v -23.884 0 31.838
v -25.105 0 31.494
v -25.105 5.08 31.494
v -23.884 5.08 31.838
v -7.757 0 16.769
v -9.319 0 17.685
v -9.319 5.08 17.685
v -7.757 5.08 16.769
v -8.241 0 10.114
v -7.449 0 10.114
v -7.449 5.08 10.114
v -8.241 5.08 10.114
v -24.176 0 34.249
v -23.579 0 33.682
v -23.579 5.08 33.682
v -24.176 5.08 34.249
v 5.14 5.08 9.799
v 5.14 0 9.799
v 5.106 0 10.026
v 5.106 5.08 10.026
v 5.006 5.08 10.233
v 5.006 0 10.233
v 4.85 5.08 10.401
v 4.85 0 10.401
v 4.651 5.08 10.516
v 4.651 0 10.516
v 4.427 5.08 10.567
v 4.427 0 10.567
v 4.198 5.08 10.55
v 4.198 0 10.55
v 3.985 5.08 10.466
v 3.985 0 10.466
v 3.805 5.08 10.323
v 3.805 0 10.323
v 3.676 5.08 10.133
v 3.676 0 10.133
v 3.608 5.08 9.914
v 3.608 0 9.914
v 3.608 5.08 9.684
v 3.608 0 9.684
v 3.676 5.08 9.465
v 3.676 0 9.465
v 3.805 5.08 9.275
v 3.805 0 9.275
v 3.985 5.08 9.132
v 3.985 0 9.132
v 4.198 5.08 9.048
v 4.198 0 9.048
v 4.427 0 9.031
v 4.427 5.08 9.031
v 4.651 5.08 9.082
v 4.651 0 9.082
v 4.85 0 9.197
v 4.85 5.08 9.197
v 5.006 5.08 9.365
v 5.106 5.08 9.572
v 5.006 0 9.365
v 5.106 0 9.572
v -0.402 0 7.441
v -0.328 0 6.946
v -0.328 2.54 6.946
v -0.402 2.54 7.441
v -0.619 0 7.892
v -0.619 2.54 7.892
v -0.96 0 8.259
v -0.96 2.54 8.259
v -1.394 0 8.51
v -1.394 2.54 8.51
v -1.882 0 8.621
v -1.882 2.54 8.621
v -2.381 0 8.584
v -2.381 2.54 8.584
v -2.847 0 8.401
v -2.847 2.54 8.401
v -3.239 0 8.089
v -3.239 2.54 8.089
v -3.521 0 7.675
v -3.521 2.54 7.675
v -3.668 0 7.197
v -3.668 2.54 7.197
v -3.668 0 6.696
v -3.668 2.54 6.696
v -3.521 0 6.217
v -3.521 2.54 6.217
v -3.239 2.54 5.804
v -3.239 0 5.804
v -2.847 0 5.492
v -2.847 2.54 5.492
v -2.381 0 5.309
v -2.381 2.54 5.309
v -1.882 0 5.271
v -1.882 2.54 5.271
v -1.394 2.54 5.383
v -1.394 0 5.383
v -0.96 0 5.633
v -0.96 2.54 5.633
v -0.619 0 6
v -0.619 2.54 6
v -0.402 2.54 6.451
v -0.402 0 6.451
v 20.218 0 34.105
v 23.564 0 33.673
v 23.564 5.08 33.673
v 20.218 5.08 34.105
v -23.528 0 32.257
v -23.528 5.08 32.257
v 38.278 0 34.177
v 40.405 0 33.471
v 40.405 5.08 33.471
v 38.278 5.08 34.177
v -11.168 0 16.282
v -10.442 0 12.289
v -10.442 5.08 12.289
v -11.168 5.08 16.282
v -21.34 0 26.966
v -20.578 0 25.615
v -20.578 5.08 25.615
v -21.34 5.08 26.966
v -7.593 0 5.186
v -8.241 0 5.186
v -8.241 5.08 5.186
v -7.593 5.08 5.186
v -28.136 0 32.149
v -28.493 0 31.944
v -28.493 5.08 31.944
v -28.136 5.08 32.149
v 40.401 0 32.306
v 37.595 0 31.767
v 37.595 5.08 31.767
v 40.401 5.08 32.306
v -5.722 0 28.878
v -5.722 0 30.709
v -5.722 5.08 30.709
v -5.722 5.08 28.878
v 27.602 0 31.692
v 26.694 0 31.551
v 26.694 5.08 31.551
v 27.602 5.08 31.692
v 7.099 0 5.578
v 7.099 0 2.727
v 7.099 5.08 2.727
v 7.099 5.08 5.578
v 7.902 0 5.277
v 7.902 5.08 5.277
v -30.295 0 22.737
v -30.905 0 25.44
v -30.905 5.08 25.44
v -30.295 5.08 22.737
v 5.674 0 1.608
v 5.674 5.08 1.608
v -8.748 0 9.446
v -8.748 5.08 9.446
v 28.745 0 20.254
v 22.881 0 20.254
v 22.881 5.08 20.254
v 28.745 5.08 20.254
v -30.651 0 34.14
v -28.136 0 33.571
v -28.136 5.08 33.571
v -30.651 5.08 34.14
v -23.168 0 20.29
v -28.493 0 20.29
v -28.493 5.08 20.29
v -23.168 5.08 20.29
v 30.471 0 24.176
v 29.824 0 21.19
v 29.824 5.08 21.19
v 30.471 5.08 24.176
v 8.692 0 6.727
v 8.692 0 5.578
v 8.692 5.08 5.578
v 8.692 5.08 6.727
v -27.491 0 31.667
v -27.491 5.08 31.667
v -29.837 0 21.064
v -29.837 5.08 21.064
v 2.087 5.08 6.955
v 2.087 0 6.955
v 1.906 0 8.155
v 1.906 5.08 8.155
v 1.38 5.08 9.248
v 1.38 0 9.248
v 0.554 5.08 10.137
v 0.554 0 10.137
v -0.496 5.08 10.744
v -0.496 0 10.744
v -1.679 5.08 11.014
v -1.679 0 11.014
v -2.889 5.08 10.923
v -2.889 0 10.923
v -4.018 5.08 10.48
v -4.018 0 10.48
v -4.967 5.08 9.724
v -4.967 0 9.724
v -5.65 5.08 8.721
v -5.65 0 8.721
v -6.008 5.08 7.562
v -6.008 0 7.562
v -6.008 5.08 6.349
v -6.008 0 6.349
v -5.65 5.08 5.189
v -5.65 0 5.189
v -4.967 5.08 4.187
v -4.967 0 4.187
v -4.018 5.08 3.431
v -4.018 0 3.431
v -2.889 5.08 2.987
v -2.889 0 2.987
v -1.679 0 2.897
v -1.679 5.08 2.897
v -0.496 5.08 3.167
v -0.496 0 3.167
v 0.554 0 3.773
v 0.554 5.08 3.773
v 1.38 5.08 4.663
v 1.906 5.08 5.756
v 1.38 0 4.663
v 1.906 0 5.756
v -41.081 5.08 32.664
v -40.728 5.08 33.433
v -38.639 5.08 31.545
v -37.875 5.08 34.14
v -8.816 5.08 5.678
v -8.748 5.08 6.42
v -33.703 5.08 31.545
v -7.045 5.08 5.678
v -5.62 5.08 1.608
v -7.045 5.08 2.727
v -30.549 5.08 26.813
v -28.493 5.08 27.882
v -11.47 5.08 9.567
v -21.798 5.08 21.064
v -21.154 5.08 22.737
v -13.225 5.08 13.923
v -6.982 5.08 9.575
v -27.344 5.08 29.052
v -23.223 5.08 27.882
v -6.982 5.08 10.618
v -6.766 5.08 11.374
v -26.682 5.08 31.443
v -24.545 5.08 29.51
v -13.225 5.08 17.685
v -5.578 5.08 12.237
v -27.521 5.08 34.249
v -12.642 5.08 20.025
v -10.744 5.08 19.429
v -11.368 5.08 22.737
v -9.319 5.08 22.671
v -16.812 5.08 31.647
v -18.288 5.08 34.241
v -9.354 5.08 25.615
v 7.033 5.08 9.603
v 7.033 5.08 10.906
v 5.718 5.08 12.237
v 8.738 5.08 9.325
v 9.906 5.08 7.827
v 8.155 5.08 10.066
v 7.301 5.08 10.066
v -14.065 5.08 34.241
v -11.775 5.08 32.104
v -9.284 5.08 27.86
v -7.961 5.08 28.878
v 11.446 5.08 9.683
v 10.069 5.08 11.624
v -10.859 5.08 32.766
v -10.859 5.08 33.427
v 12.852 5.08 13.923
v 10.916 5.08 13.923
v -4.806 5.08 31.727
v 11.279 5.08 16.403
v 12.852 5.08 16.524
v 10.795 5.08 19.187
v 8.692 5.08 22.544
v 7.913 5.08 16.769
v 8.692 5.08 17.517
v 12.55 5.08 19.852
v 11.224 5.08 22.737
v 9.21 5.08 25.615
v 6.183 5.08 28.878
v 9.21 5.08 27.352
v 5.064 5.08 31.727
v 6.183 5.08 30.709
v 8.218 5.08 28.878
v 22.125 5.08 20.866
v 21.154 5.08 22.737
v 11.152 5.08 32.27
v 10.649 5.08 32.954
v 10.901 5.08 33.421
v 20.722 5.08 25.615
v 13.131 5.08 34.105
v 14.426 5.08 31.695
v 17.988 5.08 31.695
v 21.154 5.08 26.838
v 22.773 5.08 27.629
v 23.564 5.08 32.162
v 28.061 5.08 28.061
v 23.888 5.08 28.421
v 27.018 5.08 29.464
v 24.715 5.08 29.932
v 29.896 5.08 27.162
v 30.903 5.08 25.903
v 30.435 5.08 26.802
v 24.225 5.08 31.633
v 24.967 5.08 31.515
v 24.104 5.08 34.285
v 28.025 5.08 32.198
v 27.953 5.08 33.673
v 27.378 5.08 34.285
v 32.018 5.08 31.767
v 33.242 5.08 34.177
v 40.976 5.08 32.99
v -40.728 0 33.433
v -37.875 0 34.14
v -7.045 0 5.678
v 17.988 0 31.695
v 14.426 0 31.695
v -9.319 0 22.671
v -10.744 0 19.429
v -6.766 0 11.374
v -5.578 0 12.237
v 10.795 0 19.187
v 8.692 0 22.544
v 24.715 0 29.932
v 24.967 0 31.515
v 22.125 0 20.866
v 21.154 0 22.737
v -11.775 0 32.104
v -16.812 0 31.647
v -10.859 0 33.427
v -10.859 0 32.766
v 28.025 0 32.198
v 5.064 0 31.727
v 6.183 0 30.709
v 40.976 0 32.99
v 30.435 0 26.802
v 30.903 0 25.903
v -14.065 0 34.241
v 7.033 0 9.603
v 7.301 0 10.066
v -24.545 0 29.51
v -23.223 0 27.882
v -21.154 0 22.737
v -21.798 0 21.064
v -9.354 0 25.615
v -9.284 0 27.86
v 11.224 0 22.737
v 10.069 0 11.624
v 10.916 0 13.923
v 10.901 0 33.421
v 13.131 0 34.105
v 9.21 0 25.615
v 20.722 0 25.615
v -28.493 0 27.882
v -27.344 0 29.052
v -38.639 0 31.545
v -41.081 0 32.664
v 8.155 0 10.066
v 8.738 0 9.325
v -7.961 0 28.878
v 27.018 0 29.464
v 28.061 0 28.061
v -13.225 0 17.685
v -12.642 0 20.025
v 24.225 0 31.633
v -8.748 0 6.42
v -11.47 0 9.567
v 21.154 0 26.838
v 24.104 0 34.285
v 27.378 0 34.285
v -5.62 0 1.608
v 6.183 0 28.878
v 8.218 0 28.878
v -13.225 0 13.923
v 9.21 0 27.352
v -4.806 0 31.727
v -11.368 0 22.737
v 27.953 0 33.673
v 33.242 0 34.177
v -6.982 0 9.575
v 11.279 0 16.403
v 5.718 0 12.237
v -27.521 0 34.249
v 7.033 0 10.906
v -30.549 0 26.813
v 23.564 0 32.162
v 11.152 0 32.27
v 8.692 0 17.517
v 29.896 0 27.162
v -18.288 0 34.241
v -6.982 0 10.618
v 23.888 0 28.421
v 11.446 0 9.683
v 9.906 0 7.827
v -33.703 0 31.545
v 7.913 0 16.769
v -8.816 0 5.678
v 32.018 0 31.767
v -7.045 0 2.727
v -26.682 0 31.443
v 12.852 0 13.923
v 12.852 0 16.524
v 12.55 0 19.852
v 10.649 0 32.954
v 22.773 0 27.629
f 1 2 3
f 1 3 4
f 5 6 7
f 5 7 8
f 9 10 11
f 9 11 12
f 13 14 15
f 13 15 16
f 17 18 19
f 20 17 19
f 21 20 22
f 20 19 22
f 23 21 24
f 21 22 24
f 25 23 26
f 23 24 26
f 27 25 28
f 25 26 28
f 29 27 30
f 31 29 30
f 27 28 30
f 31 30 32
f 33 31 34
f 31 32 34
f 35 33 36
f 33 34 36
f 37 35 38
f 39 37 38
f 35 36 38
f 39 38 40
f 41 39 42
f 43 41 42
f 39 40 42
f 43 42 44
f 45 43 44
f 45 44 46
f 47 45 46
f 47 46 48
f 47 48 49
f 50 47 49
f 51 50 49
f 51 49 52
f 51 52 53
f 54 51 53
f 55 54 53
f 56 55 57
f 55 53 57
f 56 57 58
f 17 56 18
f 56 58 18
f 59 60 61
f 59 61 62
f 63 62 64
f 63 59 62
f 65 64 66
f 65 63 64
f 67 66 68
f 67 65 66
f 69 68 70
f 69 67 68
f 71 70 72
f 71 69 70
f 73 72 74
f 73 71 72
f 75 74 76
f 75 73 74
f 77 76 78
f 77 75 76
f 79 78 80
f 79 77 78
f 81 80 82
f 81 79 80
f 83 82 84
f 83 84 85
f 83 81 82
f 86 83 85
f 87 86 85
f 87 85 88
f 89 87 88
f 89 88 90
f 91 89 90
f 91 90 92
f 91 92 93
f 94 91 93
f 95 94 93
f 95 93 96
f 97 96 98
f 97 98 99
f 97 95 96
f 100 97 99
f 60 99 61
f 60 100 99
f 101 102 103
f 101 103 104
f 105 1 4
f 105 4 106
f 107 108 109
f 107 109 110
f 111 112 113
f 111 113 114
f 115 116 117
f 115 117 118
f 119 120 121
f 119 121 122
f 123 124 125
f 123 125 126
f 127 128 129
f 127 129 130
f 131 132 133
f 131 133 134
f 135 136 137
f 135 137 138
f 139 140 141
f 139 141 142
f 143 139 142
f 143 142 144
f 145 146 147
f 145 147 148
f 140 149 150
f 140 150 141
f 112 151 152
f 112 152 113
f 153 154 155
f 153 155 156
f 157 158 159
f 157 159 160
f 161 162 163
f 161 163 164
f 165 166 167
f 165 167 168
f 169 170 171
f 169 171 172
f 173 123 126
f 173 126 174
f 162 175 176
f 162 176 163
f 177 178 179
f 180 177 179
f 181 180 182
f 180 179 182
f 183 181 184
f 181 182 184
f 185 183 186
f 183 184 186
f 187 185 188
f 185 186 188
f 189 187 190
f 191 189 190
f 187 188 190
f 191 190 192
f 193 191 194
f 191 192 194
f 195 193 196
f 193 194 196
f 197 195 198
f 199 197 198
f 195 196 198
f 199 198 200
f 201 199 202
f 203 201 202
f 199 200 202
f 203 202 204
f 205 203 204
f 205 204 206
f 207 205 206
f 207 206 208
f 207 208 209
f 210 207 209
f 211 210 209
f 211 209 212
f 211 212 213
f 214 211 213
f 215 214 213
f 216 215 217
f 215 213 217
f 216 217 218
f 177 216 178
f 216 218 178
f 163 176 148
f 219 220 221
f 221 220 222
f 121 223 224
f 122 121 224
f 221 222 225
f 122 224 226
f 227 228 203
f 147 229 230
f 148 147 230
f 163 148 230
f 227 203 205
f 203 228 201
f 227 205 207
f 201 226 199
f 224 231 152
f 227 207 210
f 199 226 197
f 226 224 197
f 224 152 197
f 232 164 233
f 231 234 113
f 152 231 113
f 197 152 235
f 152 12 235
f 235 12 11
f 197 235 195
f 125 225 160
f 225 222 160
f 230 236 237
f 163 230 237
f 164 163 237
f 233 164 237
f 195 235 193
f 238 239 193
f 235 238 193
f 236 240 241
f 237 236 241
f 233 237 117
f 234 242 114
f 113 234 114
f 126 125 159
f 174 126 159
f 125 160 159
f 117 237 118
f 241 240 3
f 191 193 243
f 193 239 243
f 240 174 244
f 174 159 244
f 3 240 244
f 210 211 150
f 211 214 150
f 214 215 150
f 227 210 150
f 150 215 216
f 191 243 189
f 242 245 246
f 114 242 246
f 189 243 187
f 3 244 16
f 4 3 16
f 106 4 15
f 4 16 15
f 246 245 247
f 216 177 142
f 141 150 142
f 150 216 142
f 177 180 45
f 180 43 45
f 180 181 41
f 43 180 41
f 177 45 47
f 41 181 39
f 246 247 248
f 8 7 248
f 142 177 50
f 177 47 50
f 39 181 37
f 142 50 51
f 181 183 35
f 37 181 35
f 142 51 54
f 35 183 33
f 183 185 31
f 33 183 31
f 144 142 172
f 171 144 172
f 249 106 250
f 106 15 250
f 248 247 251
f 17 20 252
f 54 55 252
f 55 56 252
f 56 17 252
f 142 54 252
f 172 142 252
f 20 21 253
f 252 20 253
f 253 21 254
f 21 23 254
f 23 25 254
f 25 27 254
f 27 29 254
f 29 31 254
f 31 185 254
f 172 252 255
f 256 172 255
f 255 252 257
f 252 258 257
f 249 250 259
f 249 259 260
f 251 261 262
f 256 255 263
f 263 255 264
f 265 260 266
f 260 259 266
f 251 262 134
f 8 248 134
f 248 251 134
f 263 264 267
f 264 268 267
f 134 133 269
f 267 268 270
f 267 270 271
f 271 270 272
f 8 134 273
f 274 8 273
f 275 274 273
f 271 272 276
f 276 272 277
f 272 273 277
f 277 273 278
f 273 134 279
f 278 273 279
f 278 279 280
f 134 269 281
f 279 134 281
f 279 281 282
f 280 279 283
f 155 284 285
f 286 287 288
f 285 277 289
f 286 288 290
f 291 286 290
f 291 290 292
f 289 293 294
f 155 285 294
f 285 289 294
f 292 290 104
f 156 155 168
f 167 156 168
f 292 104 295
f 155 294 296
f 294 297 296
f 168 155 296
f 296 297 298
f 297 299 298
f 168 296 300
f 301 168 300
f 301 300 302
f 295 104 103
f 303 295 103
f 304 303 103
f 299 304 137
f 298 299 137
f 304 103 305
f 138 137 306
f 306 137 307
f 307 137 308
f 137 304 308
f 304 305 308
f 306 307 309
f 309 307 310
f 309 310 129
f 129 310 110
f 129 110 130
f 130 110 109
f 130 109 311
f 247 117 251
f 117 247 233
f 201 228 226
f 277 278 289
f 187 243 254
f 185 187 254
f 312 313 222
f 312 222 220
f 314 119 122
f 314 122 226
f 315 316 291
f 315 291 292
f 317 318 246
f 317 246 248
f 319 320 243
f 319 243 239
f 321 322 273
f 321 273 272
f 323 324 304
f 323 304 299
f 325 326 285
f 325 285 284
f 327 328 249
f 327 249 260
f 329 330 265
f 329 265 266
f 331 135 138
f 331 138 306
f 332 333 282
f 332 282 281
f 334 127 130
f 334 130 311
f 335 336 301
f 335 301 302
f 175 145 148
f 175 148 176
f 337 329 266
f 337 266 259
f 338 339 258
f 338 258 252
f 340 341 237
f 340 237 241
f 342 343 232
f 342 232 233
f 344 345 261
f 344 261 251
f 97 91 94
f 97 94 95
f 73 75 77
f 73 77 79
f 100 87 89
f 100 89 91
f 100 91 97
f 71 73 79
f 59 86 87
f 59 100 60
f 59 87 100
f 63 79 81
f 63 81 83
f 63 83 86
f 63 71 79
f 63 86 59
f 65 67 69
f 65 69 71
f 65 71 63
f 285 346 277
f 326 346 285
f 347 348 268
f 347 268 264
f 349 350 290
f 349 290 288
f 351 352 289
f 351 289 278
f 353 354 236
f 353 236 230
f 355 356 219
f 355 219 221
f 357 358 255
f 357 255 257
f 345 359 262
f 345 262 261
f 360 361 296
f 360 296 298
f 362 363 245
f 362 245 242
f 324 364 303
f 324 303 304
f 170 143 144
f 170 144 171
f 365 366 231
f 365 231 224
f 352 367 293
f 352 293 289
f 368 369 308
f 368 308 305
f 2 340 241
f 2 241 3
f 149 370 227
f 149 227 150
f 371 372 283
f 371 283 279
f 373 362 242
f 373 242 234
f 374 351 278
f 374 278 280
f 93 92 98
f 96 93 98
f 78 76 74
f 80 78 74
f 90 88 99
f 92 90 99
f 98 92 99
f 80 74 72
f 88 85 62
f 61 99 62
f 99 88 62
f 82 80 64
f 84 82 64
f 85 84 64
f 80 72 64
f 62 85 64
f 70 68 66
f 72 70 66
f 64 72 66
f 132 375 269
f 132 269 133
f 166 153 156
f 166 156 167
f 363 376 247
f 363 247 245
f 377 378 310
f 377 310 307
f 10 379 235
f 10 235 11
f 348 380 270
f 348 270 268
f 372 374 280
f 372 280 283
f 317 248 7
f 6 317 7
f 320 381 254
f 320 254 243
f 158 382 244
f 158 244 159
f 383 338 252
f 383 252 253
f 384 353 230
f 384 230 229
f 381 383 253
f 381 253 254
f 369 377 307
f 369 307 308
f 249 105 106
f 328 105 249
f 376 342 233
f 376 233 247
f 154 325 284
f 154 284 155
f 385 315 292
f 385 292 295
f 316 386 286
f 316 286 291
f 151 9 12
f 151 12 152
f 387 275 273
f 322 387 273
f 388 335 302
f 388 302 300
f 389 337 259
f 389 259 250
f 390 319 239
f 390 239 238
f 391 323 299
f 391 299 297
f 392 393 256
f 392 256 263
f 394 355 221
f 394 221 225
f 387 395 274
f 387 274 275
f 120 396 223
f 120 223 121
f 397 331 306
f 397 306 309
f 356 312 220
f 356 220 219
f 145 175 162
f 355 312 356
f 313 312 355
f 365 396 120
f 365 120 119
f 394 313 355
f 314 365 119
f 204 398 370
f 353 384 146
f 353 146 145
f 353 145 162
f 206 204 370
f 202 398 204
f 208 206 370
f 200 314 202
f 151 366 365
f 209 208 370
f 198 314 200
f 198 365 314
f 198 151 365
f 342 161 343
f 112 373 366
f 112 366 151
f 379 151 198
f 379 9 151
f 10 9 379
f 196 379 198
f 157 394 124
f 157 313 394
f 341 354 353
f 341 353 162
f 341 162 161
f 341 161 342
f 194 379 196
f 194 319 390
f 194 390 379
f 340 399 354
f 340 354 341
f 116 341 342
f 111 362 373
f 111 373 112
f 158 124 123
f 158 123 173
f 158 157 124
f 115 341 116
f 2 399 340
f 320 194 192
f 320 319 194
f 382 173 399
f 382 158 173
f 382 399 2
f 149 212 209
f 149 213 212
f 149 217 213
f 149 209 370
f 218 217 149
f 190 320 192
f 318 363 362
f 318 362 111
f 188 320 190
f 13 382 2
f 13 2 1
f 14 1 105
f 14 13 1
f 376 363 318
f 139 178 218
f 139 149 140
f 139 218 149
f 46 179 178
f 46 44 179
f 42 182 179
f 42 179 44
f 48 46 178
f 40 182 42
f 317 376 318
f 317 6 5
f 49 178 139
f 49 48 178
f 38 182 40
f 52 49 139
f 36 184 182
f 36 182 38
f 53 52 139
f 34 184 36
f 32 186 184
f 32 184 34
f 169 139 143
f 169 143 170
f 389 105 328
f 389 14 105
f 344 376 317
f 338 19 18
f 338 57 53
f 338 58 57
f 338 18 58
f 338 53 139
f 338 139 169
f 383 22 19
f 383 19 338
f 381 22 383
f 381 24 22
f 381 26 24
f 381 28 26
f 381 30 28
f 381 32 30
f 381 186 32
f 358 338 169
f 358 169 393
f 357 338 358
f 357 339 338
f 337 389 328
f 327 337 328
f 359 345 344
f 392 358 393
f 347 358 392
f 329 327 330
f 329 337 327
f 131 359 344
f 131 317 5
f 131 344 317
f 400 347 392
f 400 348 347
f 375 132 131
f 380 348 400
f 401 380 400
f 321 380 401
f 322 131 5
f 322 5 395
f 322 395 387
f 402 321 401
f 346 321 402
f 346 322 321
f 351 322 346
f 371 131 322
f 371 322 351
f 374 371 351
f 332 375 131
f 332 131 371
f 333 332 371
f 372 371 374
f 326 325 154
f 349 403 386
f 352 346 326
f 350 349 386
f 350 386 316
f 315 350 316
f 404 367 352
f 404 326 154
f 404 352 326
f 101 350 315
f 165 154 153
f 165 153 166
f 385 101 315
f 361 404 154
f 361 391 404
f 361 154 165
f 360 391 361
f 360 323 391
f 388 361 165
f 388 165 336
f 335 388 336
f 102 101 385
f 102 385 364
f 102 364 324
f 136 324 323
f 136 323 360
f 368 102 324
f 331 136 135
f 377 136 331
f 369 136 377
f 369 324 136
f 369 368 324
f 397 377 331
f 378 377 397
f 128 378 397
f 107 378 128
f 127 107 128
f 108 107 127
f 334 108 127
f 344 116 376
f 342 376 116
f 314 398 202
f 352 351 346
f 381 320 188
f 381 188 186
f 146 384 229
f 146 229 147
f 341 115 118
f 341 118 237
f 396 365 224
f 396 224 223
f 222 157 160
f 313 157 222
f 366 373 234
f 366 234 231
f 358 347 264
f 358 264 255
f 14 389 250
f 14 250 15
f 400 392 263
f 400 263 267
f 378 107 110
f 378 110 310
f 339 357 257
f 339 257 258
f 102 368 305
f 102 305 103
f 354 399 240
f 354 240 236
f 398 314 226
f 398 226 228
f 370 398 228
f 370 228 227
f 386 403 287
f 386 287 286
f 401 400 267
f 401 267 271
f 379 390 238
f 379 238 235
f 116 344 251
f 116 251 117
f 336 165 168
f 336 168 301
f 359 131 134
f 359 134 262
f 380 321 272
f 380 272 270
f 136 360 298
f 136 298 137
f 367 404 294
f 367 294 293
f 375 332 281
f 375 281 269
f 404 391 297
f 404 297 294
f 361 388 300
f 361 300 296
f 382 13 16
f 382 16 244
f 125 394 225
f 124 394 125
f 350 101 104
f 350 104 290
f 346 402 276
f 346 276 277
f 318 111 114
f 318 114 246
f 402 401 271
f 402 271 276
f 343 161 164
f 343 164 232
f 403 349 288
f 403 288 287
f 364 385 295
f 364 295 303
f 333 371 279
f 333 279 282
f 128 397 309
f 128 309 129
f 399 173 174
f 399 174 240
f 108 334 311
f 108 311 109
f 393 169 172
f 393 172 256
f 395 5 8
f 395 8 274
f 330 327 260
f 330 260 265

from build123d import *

# Parameters (mm, degrees)
F0_R     = 4.069971
F0_R_2   = 0.770086
F1_DEPTH = 5.08
F2_R     = 1.679723
F3_DEPTH = 2.54


with BuildPart() as f1:
    # F0 (on Front) → F1 (new body)
    with BuildSketch(Plane.XZ):
        Polygon((-9.318665, 22.670845), (-9.353687, 25.614712), (-20.578111, 25.614712), (-21.153722, 22.736656), (-11.368327, 22.736656), align=None)
        Polygon((-9.283642, 27.860334), (-9.353687, 25.614712), (-9.318665, 22.670845), (-9.318665, 17.684866), (-7.757322, 16.769072), (7.912902, 16.769072), (8.691694, 17.516764), (8.691694, 22.543664), (9.209785, 25.614712), (9.209785, 27.351562), (8.218166, 28.877882), (6.183073, 28.877882), (6.183073, 30.709466), (5.06377, 31.727012), (-4.806436, 31.727012), (-5.722228, 30.709466), (-5.722228, 28.877882), (-7.960832, 28.877882), align=None)
        Polygon((-21.153722, 22.736656), (-20.578111, 25.614712), (-21.340223, 26.965873), (-23.222685, 27.881665), (-24.545496, 29.50974), (-25.105147, 31.493958), (-23.884091, 31.838358), (-23.52795, 32.257117), (-16.81214, 31.646591), (-11.775281, 32.104485), (-10.859489, 32.765891), (-10.859489, 33.427294), (-14.064763, 34.241334), (-18.287582, 34.241334), (-23.578826, 33.681683), (-24.175683, 34.248885), (-27.521426, 34.248885), (-28.136475, 33.570868), (-26.377082, 33.172909), (-26.334074, 32.766288), (-28.136475, 32.148954), (-27.490808, 31.666695), (-26.682345, 31.443078), (-27.34375, 29.051844), (-28.492769, 27.881665), (-30.549023, 26.813241), (-30.905165, 25.439551), (-30.294636, 22.736656), (-29.83674, 21.064099), (-28.492769, 20.290306), (-23.168363, 20.290306), (-21.798119, 21.064099), align=None)
        Polygon((-10.744238, 19.428659), (-9.318665, 22.670845), (-11.368327, 22.736656), (-12.641548, 20.025223), (-13.22489, 17.684866), (-13.22489, 13.922821), (-11.470282, 9.566554), (-8.747616, 6.420361), (-8.747616, 9.445547), (-10.44172, 12.289221), (-11.167764, 16.282465), align=None)
        Polygon((-8.240691, 10.114433), (-8.747616, 9.445547), (-8.747616, 6.420361), (-8.816303, 5.67781), (-8.240691, 5.185759), (-7.593128, 5.185759), (-7.045039, 5.67781), (-6.981541, 9.574797), (-7.449226, 10.114433), align=None)
        Polygon((11.224424, 22.736656), (8.691694, 22.543664), (10.795082, 19.186644), (11.279112, 16.403474), (10.91609, 13.922821), (10.069037, 11.623681), (8.737955, 9.324539), (8.155205, 10.066222), (7.30082, 10.066222), (7.032725, 9.603148), (7.098865, 5.577749), (7.901572, 5.276848), (8.691694, 5.577749), (8.691694, 6.727319), (9.905946, 7.827047), (11.446381, 9.683122), (12.852208, 13.922821), (12.852208, 16.524481), (12.549689, 19.852184), align=None)
        Polygon((9.209785, 25.614712), (8.691694, 22.543664), (11.224424, 22.736656), (21.153722, 22.736656), (20.722013, 25.614712), align=None)
        Polygon((7.098865, 5.577749), (7.032725, 9.603148), (7.032725, 10.905899), (5.717888, 12.237), (-5.578488, 12.237), (-6.765687, 11.373583), (-6.981541, 10.618092), (-6.981541, 9.574797), (-7.045039, 5.67781), (-7.045039, 2.726923), (-5.620473, 1.607623), (5.674298, 1.607623), (7.098865, 2.726923), align=None)
        with Locations((-1.983154, 6.955266)):
            Circle(F0_R, mode=Mode.SUBTRACT)
        with Locations((4.369736, 9.79894)):
            Circle(F0_R_2, mode=Mode.SUBTRACT)
        Polygon((20.722013, 25.614712), (21.153722, 22.736656), (22.125067, 20.865917), (22.880556, 20.254329), (28.744599, 20.254329), (29.823871, 21.189697), (30.471433, 24.175683), (30.903142, 25.902517), (30.435458, 26.80191), (29.895823, 27.161669), (28.061062, 28.061062), (27.017767, 29.464114), (26.693985, 31.550705), (27.601909, 31.69159), (28.025085, 32.198269), (32.01839, 31.76656), (37.594628, 31.76656), (40.400732, 32.306198), (40.976346, 32.989737), (40.404701, 33.471123), (38.278166, 34.176935), (33.241566, 34.176935), (27.953135, 33.673275), (27.377523, 34.28486), (24.103733, 34.28486), (23.564097, 33.673275), (25.092266, 33.271004), (25.092266, 32.609597), (23.564097, 32.162294), (24.224728, 31.632844), (24.967151, 31.51473), (24.715319, 29.931799), (23.887878, 28.420819), (22.772631, 27.629353), (21.153724, 26.837887), align=None)
        Polygon((-28.492769, 31.943833), (-28.136475, 32.148954), (-26.334074, 32.766288), (-26.377082, 33.172909), (-28.136475, 33.570868), (-30.650778, 34.139581), (-37.875362, 34.139581), (-40.728143, 33.433209), (-41.080635, 32.664135), (-38.638525, 31.544834), (-33.70342, 31.544834), align=None)
        Polygon((17.98786, 31.69461), (23.564097, 32.162294), (25.092266, 32.609597), (25.092266, 33.271004), (23.564097, 33.673275), (20.218354, 34.104981), (15.757365, 34.104981), (13.131138, 34.104981), (10.900644, 33.421442), (10.648813, 32.953758), (11.152473, 32.270219), (14.426264, 31.69461), align=None)
    extrude(amount=-F1_DEPTH)


with BuildPart() as f3:
    # F2 (on Front) → F3 (new body)
    with BuildSketch(Plane.XZ):
        with Locations((-2.00727, 6.946239)):
            Circle(F2_R)
    extrude(amount=-F3_DEPTH)


solid = Compound([f1.part, f3.part])
